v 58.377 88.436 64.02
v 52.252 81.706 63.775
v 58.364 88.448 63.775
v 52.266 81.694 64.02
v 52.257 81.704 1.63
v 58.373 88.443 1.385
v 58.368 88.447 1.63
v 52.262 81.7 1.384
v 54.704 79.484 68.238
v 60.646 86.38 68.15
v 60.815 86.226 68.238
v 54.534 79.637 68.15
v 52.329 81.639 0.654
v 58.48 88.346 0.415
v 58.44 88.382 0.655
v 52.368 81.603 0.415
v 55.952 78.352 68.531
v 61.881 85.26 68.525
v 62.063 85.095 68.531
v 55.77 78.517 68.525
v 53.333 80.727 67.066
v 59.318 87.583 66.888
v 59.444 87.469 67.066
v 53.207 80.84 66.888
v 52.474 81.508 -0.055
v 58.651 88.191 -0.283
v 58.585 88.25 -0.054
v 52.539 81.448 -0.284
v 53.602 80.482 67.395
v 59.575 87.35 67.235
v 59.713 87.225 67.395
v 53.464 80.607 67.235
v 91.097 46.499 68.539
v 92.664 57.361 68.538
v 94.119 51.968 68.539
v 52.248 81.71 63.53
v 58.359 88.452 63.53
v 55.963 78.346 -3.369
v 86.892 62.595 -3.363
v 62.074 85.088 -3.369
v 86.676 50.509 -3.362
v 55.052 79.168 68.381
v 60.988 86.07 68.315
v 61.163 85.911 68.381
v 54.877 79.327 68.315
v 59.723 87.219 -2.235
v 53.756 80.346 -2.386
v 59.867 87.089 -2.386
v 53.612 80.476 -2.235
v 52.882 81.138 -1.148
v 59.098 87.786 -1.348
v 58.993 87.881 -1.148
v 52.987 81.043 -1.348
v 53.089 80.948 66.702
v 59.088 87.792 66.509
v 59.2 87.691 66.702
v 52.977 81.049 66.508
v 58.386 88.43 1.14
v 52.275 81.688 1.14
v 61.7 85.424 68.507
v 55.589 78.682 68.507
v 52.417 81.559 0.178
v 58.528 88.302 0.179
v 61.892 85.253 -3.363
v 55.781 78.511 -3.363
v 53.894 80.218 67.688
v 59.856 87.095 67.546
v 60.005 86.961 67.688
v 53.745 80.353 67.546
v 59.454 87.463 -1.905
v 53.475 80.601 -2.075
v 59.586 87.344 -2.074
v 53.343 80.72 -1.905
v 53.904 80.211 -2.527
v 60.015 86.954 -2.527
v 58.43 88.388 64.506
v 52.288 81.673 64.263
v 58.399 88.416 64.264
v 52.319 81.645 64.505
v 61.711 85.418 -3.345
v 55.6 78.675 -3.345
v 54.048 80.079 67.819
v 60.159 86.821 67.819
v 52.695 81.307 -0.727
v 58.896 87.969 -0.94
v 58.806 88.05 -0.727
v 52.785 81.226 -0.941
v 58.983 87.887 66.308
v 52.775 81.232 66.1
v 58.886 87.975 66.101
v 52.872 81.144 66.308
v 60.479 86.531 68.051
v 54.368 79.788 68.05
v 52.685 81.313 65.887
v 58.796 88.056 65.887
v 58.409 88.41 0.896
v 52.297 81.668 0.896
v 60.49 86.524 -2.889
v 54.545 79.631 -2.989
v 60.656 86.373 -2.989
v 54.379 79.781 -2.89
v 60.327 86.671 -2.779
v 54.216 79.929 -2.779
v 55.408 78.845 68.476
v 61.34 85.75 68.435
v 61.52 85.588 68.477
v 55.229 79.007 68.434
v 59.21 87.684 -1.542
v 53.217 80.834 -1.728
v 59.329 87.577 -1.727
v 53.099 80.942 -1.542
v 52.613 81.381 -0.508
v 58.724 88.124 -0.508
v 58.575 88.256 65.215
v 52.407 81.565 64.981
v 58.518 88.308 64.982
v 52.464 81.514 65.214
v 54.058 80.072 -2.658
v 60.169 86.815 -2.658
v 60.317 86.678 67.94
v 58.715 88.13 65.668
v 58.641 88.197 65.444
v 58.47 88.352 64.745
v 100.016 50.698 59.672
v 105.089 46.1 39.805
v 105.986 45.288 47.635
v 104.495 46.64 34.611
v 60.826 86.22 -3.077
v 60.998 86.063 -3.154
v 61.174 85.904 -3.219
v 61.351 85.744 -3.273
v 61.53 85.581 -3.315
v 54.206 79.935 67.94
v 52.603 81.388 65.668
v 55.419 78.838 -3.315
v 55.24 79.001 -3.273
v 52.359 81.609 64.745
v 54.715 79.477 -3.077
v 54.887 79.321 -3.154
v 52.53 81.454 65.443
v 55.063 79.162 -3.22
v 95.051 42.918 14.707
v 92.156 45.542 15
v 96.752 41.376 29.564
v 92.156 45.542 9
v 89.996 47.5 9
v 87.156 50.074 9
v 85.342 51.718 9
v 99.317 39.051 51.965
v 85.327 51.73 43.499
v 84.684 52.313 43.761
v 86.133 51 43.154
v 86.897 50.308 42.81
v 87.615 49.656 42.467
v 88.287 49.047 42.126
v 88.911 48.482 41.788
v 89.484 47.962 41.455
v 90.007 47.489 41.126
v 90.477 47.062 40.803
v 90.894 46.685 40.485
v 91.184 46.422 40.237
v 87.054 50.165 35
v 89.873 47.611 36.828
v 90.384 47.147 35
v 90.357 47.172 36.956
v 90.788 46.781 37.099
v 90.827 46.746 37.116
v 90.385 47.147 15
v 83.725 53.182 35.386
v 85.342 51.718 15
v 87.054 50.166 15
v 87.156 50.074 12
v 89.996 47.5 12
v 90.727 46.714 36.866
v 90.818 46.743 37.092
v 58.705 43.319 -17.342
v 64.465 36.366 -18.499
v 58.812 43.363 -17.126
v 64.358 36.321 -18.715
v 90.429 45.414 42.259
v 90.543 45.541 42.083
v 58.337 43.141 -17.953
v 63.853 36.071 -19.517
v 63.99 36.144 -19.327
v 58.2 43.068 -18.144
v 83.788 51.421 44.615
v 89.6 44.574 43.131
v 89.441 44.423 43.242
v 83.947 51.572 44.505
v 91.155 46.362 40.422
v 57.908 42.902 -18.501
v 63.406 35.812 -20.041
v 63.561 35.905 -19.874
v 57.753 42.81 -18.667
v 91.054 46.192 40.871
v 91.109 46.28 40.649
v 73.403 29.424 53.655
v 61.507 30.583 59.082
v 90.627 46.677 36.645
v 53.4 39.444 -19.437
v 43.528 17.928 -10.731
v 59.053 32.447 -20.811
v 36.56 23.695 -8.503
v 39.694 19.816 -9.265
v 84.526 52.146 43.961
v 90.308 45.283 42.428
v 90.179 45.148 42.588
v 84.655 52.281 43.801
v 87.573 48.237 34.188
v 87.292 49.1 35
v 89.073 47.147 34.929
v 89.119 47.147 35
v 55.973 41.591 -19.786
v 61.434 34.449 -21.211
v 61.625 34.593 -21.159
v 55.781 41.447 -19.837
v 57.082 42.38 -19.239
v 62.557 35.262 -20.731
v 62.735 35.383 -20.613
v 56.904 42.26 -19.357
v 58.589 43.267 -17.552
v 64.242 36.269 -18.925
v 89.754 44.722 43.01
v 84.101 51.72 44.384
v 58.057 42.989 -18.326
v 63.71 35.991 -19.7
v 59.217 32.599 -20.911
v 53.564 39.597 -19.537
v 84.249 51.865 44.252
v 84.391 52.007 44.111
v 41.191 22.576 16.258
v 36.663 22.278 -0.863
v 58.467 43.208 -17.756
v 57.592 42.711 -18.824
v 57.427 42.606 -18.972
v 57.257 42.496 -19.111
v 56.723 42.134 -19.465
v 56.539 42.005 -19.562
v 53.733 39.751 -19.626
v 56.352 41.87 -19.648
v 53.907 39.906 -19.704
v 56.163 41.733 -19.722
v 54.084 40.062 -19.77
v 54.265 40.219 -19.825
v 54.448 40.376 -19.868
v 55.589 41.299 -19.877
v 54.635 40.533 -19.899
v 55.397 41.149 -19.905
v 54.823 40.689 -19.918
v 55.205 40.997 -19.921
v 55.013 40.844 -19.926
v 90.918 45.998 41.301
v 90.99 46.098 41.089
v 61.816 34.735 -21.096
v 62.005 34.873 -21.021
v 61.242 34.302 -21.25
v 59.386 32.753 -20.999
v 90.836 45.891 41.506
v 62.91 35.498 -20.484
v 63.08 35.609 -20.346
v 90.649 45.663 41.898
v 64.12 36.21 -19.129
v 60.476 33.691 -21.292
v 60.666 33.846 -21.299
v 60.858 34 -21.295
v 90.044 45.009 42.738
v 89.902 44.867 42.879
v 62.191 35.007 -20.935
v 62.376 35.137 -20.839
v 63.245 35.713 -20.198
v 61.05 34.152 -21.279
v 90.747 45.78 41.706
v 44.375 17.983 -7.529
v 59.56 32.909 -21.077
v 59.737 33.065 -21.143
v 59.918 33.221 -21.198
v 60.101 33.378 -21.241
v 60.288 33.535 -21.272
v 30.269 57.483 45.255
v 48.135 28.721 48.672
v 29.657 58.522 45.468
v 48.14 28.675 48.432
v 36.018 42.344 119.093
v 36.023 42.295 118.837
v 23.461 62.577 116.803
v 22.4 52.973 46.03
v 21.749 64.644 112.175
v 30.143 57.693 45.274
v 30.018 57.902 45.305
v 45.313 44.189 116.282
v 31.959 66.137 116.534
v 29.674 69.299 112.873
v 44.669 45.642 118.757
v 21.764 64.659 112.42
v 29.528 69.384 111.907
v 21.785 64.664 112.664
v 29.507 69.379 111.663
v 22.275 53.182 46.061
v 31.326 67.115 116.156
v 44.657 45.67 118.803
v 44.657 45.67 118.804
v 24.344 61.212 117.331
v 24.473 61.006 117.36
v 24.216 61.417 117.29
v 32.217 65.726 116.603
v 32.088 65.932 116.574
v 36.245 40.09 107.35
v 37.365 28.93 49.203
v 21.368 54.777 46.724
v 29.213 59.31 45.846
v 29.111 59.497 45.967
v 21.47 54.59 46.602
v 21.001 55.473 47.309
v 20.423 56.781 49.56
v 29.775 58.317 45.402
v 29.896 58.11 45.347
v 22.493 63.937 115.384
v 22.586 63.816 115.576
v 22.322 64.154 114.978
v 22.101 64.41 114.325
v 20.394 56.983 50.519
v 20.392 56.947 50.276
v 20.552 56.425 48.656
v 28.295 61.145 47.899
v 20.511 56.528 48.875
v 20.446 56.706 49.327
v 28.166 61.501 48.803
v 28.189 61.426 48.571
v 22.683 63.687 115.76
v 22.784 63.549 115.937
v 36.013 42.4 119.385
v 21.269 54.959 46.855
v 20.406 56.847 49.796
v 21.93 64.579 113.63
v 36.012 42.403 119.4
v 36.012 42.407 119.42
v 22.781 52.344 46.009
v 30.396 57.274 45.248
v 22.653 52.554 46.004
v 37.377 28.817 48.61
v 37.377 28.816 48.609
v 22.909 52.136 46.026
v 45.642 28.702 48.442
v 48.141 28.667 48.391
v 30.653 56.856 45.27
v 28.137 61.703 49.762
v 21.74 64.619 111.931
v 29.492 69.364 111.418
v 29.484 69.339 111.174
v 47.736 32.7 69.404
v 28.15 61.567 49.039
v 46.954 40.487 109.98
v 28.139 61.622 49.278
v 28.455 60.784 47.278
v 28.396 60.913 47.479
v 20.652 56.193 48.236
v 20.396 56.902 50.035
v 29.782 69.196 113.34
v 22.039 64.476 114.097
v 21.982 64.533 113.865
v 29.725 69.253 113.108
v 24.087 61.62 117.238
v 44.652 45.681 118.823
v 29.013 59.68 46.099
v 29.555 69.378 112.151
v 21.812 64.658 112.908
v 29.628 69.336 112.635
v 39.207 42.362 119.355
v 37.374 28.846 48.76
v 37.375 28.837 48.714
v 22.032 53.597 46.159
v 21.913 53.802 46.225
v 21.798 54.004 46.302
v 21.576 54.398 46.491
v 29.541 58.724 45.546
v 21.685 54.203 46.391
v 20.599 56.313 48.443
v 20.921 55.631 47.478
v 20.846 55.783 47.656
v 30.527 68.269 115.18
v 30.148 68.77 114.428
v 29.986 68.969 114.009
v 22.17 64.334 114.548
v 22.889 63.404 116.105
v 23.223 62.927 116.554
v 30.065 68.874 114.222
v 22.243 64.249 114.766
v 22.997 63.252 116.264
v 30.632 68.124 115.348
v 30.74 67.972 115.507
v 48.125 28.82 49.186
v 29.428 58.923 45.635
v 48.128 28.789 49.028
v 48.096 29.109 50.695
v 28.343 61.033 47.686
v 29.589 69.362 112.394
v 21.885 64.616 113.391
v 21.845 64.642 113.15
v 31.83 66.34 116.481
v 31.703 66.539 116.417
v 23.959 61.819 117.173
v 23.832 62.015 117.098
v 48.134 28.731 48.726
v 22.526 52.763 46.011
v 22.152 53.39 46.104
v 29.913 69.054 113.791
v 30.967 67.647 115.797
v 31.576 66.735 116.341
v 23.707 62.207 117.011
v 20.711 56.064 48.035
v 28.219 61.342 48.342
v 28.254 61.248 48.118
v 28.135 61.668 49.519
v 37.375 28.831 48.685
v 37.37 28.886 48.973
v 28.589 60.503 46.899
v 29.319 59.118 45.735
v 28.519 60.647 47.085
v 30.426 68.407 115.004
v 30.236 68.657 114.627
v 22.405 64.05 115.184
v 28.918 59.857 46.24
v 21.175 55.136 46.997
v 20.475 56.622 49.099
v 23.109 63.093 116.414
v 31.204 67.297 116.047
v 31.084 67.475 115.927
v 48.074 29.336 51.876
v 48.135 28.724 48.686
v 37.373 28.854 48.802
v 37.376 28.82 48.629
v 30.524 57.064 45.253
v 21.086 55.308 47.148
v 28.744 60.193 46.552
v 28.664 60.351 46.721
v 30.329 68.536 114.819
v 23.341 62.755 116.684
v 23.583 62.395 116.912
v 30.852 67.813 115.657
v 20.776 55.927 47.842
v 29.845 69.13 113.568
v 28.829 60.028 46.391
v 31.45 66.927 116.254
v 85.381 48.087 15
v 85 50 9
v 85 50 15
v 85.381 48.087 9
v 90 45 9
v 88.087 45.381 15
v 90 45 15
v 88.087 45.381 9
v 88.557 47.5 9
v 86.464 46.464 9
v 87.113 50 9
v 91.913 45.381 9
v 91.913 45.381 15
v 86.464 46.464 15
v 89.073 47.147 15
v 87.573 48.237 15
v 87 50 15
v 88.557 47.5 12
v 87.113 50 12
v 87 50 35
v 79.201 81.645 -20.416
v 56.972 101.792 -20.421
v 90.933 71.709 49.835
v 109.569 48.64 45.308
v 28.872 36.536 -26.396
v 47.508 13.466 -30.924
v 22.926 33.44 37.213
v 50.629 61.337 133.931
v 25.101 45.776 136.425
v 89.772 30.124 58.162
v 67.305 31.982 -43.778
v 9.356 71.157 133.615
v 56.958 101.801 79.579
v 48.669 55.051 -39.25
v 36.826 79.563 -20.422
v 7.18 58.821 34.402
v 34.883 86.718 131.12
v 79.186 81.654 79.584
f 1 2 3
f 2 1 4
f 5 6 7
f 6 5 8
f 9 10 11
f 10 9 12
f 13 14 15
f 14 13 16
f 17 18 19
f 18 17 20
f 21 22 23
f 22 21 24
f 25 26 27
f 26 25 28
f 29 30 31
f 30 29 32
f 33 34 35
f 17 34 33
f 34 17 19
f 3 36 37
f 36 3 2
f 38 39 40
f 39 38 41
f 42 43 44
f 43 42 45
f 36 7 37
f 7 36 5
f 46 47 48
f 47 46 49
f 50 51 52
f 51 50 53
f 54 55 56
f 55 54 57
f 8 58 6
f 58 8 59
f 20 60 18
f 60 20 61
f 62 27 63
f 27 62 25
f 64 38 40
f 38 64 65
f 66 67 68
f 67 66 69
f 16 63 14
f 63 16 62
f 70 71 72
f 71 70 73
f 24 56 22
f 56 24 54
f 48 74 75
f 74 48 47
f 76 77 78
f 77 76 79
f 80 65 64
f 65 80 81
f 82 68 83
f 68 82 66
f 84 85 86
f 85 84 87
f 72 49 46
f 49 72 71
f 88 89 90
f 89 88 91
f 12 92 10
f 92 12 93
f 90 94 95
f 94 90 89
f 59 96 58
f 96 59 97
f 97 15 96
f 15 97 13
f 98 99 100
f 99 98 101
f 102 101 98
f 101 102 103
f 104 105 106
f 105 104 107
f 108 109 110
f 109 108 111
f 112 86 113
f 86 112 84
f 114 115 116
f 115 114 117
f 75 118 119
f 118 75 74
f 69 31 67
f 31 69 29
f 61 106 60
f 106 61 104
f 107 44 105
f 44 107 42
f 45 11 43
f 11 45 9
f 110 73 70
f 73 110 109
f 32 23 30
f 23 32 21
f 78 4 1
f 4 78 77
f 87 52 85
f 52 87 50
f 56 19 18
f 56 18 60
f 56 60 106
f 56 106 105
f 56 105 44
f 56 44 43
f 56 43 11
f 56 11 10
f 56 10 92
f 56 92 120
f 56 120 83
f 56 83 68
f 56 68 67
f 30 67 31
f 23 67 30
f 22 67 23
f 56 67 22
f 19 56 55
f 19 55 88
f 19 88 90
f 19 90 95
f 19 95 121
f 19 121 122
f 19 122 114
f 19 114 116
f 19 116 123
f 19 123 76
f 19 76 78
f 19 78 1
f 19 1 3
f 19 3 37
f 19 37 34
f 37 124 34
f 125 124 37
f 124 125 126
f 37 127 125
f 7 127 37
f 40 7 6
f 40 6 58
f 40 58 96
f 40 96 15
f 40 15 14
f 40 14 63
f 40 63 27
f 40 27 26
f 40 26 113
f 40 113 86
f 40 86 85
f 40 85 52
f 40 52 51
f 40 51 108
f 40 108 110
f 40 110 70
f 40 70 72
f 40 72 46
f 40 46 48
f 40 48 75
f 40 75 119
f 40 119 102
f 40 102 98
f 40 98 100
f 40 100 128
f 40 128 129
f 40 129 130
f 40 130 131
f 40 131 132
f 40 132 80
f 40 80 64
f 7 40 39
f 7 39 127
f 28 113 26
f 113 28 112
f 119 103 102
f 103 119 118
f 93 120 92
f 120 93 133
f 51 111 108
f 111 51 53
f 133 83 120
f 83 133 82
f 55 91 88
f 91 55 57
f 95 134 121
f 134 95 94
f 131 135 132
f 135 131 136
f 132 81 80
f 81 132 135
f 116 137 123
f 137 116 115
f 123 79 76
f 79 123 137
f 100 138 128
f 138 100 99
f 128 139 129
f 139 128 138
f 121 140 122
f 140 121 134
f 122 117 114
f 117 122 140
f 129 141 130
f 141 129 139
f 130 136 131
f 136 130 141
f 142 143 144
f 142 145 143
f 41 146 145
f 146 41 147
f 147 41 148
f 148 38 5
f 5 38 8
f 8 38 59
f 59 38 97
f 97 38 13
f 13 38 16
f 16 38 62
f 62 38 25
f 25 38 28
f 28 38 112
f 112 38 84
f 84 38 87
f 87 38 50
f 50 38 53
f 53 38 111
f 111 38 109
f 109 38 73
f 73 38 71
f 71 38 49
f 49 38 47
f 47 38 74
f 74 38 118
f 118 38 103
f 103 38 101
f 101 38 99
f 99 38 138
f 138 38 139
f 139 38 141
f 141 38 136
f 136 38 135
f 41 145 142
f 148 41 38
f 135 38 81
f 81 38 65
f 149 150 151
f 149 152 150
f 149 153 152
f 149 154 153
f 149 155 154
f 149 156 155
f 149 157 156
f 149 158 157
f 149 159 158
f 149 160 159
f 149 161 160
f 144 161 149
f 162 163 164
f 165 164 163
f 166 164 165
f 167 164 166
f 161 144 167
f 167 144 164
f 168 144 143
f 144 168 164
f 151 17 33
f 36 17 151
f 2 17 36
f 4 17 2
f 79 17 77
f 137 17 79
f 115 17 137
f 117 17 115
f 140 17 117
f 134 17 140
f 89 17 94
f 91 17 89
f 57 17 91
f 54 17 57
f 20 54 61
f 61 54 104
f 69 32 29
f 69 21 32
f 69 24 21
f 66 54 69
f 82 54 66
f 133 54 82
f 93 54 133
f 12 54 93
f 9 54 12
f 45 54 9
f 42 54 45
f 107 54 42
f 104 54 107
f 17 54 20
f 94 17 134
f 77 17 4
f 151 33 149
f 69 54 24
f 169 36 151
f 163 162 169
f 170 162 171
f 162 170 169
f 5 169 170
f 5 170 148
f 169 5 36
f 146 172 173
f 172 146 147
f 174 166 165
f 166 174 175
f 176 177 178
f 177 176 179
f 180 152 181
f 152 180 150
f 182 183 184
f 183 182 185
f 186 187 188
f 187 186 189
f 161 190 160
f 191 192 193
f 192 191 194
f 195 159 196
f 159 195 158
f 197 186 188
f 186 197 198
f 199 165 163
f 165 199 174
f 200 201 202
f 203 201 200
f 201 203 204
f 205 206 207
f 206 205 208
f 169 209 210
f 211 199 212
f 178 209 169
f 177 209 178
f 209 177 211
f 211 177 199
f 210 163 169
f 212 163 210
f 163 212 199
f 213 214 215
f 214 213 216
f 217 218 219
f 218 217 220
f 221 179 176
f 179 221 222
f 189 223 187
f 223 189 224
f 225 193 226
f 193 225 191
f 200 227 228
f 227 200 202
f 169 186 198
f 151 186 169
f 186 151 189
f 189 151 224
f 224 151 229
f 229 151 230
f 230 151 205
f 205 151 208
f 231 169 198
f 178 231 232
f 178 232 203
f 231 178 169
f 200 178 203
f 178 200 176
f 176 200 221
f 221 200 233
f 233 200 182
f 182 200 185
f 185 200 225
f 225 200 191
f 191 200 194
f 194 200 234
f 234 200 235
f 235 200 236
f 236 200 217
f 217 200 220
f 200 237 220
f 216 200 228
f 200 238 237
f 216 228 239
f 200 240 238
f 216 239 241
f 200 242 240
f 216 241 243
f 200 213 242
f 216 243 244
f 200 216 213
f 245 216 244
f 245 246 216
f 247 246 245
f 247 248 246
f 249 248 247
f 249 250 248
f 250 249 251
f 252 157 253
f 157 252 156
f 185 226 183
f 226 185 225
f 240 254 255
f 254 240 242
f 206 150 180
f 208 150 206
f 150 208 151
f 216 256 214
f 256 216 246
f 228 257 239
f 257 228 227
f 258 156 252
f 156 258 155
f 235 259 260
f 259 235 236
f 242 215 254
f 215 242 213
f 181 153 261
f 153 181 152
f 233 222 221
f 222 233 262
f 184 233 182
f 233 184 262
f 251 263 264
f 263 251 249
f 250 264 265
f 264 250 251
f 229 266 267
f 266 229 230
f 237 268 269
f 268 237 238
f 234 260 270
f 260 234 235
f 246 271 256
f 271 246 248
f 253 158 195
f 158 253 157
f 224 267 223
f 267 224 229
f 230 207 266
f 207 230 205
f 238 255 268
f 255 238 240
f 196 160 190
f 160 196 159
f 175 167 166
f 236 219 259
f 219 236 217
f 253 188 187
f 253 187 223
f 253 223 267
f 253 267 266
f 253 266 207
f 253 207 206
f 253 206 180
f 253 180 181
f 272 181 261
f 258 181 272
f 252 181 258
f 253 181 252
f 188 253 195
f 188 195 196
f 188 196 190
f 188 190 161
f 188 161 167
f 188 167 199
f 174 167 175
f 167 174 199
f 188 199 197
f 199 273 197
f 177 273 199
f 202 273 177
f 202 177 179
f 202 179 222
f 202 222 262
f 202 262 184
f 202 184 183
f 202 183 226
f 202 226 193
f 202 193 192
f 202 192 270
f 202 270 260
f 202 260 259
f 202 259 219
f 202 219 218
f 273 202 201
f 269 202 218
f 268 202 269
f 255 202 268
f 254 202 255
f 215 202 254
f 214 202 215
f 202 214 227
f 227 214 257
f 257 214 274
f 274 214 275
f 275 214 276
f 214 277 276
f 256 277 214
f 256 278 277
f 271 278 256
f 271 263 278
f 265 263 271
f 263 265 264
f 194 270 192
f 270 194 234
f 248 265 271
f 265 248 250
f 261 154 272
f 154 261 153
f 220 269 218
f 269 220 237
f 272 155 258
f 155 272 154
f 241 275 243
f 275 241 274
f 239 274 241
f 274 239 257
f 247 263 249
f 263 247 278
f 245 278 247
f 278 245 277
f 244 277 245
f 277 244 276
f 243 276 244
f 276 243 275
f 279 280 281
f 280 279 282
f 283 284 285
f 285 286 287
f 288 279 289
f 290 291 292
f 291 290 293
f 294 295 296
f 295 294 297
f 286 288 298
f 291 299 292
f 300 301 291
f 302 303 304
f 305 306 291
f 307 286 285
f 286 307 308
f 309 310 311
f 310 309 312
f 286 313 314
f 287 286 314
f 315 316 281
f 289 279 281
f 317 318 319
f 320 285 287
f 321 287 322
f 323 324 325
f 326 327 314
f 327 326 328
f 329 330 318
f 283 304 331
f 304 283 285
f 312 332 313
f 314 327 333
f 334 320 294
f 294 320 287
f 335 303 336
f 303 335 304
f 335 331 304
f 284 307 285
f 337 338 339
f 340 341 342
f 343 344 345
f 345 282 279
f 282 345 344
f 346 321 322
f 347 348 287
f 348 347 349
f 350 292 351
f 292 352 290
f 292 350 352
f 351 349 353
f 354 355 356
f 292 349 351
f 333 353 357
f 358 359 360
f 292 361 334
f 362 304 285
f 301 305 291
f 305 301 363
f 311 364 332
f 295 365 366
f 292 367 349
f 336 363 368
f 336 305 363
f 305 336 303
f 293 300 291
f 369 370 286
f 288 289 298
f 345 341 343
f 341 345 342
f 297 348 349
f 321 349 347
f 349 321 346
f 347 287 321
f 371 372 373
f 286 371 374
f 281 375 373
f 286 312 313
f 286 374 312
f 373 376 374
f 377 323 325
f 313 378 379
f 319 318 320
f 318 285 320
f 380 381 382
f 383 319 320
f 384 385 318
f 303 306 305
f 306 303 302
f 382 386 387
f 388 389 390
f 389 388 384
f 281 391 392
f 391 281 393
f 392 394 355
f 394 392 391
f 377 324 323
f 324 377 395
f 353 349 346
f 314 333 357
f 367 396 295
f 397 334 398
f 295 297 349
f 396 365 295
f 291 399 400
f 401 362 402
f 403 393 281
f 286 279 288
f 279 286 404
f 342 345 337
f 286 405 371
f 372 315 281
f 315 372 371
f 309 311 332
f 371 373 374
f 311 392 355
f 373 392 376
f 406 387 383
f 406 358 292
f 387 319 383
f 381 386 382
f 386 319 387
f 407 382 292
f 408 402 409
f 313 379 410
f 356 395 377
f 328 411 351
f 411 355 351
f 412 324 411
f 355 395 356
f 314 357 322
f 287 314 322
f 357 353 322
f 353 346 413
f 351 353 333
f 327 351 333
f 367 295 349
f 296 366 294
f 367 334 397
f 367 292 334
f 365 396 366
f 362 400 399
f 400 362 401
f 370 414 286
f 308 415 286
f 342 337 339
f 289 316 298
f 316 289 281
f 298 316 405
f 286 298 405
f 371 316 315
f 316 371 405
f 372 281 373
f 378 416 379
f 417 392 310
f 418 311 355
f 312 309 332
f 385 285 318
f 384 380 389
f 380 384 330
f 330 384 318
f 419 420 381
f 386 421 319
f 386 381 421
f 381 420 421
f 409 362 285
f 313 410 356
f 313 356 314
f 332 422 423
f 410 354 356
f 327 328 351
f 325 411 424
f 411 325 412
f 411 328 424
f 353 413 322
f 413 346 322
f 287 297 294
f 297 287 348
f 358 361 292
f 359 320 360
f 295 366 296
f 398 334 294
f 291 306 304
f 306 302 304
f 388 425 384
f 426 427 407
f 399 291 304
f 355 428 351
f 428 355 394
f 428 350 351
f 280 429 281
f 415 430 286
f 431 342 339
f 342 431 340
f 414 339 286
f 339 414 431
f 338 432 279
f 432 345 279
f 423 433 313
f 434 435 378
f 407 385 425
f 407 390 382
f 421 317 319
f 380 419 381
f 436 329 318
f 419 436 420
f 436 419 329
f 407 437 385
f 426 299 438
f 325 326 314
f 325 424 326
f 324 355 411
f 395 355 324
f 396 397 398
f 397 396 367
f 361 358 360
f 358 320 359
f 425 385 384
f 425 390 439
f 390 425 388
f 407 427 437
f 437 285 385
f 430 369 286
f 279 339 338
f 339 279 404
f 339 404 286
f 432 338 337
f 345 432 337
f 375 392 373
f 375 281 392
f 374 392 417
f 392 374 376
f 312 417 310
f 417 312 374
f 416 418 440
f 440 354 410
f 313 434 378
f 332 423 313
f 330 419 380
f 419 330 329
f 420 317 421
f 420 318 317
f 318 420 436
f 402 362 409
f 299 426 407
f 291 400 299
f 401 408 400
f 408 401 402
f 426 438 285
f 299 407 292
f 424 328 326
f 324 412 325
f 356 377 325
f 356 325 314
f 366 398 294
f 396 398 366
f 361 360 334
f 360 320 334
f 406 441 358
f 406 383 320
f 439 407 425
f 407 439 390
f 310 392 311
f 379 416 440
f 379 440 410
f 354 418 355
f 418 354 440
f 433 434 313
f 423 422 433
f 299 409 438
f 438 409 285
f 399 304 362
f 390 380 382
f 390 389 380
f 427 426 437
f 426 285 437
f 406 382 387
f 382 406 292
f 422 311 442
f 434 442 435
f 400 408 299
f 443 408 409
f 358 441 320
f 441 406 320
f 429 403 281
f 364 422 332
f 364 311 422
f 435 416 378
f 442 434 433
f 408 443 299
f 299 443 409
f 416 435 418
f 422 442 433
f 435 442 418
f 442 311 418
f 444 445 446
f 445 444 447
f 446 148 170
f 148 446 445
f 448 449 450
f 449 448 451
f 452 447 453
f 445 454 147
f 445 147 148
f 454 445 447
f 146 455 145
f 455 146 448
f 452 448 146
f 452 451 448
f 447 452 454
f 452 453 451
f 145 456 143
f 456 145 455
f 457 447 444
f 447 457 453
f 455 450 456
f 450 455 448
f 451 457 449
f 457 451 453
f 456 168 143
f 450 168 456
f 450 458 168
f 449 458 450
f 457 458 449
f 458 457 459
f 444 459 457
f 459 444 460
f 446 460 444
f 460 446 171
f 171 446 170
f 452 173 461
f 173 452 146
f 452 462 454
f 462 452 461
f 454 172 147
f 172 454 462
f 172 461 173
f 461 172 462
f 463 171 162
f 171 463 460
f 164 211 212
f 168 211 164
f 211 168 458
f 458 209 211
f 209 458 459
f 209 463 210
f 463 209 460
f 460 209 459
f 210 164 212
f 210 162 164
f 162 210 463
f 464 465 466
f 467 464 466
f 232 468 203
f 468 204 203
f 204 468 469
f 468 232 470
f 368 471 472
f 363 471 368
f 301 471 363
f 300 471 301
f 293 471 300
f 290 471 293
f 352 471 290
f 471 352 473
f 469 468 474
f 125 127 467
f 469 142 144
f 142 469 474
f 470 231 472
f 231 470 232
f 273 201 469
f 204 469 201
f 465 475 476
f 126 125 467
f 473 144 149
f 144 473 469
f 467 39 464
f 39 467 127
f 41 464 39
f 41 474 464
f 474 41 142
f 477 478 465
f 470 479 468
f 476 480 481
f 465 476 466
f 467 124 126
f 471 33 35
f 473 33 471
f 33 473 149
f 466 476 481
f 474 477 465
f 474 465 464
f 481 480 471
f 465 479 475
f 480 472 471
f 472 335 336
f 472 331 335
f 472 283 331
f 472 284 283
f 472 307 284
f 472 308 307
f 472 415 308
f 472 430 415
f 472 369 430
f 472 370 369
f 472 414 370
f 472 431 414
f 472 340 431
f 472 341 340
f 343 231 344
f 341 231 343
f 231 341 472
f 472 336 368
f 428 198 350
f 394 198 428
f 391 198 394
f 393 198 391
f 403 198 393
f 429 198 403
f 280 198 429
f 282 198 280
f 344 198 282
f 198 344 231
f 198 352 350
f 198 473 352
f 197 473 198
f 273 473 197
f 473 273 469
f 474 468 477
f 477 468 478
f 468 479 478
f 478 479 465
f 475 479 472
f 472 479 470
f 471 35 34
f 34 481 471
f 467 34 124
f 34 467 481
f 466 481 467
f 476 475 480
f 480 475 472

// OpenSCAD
// file: layouts/l6-playa.scad
POSITIONS = [
  [[131.59, 277.196, 80],  [20.2851, 56.366, 45.558]],
  [[100.181, 89.99, 327.994],   [58.35841, 88.4529, 68.5301]],
  [[250.596, 117.019, 21.5107], [92.7403, 47.5094, 41.0992]]
];
// file: nutsnbolts/data-access.scad
// Norm Nuts and Bolts - a OpenSCAD library
// Copyright (C) 2012  Johannes Kneer

// This program is free software: you can redistribute it and/or modify
// it under the terms of the GNU General Public License as published by
// the Free Software Foundation, either version 3 of the License, or
// (at your option) any later version.

// This program is distributed in the hope that it will be useful,
// but WITHOUT ANY WARRANTY; without even the implied warranty of
// MERCHANTABILITY or FITNESS FOR A PARTICULAR PURPOSE.  See the
// GNU General Public License for more details.

// You should have received a copy of the GNU General Public License
// along with this program.  If not, see <http://www.gnu.org/licenses/>.


// DATABASE ACCESS FUNCTIONS AND CONSTANTS



// == CONSTANTS ==

// screw table access keys
_NB_S_DESC            = 0;
_NB_S_FAMKEY			    = 1;
_NB_S_LENGTH          = 2;
_NB_S_NOTHREAD_LENGTH = 3;

_NB_F_DESC			      = 0;
_NB_F_OUTER_DIA       = 1;
_NB_F_INNER_DIA       = 2;
_NB_F_LEAD            = 3;
_NB_F_KEY             = 4;
_NB_F_KEY_DEPTH       = 5;
_NB_F_HEAD_HEIGHT     = 6;
_NB_F_HEAD_DIA        = 7;
_NB_F_NUT_KEY         = 8;
_NB_F_NUT_HEIGHT      = 9;
_NB_F_PITCH_FINE      = 10;
_NB_F_PITCH_MEDIUM    = 11;
_NB_F_PITCH_COARSE    = 12;


// == FUNCTIONS ==

// _get_screw("descriptor")   with descriptor = M8x25
//   find the line for a general object in the data matrix

function _get_screw(n) = data_screw[search([n], data_screw)[0]];
function _get_screw_fam(n) = data_screw_fam[search([_get_screw(n)[_NB_S_FAMKEY]], data_screw_fam)[0]];

function _get_fam(n) = data_screw_fam[search([n], data_screw_fam)[0]];


// _get_XXXXX("descriptor") functions
// find a single property in the database

function _get_desc(n)        = _get_screw(n)[_NB_S_DESC];
function _get_famkey(n)         = _get_screw(n)[_NB_S_FAMKEY];
function _get_length(n)      = _get_screw(n)[_NB_S_LENGTH];
function _get_nt_length(n)   = _get_screw(n)[_NB_S_NOTHREAD_LENGTH];

function _get_outer_dia(n)   = _get_screw_fam(n)[_NB_F_OUTER_DIA];
function _get_inner_dia(n)   = _get_screw_fam(n)[_NB_F_INNER_DIA];
function _get_lead(n)        = _get_screw_fam(n)[_NB_F_LEAD];
function _get_head_height(n) = _get_screw_fam(n)[_NB_F_HEAD_HEIGHT];
function _get_head_dia(n)    = _get_screw_fam(n)[_NB_F_HEAD_DIA];
function _get_nut_key(n)     = _get_screw_fam(n)[_NB_F_NUT_KEY];
function _get_nut_height(n)  = _get_screw_fam(n)[_NB_F_NUT_HEIGHT];
function _get_fine_pitch(n)  = _get_screw_fam(n)[_NB_F_PITCH_FINE];
function _get_medium_pitch(n)  = _get_screw_fam(n)[_NB_F_PITCH_MEDIUM];
function _get_coarse_pitch(n)  = _get_screw_fam(n)[_NB_F_PITCH_COARSE];
// file: scad-utils/mirror.scad
// Copyright (c) 2013 Oskar Linde. All rights reserved.
// License: BSD
//
// This library contains simple mirroring functions
//
// mirror_x()
// mirror_y()
// mirror_z()


module mirror_x() {
  union() {
    child();
    scale([-1,1,1]) child();
  }
}

module mirror_y() {
  union() {
    child();
    scale([1,-1,1]) child();
  }
}

module mirror_z() {
  union() {
    child();
    scale([1,1,-1]) child();
  }
}
// file: constants.scad
include <layouts/l6-playa.scad>

INCH = 25.4;
CUBE_SIZE = 100;
CEIL_CLEARANCE = 600;
NUM_PHONES = 3;
DRAW_RANDOM = false;


PANE_WIDTH = 10 * INCH;
PANE_HEIGHT = 8 * INCH;
PANE_THICKNESS = 2;

FRAME_PADDING = INCH / 4;

FRAME_WIDTH = PANE_WIDTH + 2 * FRAME_PADDING;
FRAME_HEIGHT = PANE_HEIGHT + 2 * FRAME_PADDING;
FRAME_THICKNESS = INCH / 4;


PHONE_HEIGHT = 147.8;
PHONE_WIDTH = 71.9;
PHONE_DEPTH = 9.1;
PHONE_SCREEN_TOP = 19; //wrt case top
PHONE_SCREEN_HEIGHT = 110;
PHONE_SCREEN_WIDTH = 68;
PHONE_LENS_DIA = 11.85;
PHONE_LENS_OFFSET_LEFT = 3;
PHONE_LENS_OFFSET_TOP = 3.65;
PHONE_LENS_FIELD_OF_VIEW = 81;
PHONE_POWER_BUTTON_TOP = 52;

CASE_THICKNESS = 1.5;
WALL_THICKNESS = 3;
CASE_HEIGHT = PHONE_HEIGHT + 2 * WALL_THICKNESS;
CASE_WIDTH = PHONE_WIDTH + 2 * WALL_THICKNESS;
CASE_DEPTH = PHONE_DEPTH + 2 * CASE_THICKNESS;

// new iteration using baby USB cams
BOARD_WIDTH = 32.5;
BOARD_HEIGHT = 32.5;
BOARD_DEPTH = 5;

USB_MICROB_WIDTH = 8;
USB_MICROB_LENGTH = 5;
USB_CHANNEL_WIDTH = 8;
USB_CHANNEL_LENGTH = 20;
USB_CHANNEL_DEPTH = 20;

CASE_ANCHOR_OFFSET = 14;
CASE_ANCHOR_POINTS = [
  [0, 0, 0],
  [0, BOARD_HEIGHT, 0],
  [BOARD_WIDTH, BOARD_HEIGHT, 0],
  [BOARD_WIDTH, 0, 0]
];

PANE_ANCHOR_OFFSET = 0;
PANE_ANCHOR_POINTS = [
  [0, PANE_ANCHOR_OFFSET, 0],
  [0, PANE_HEIGHT - PANE_ANCHOR_OFFSET, 0],
  [PANE_WIDTH, PANE_HEIGHT - PANE_ANCHOR_OFFSET, 0],
  [PANE_WIDTH, PANE_ANCHOR_OFFSET, 0]
];

HOLDER_WIDTH = 100;
HOLDER_HEIGHT = 20;
HOLDER_DEPTH = 30;
HOLDER_FOOT = 10;


d = 0.01;
d2 = 2 * d;
wiggle = 1;
// file: helpers.scad
include <constants.scad>

function get_rotation_matricies(theta) = [
  [[1, 0, 0], [0, cos(theta), -sin(theta)], [0, sin(theta), cos(theta)]],
  [[cos(theta), 0, sin(theta)], [0, 1, 0], [-sin(theta), 0, cos(theta)]],
  [[cos(theta), -sin(theta), 0], [sin(theta), cos(theta), 0], [0, 0, 1]]
];

function get_rotation_matrix(axis, theta) = get_rotation_matricies(theta)[axis];

function rotate_point(rotation, point) =
  get_rotation_matrix(2, rotation[2]) *
  get_rotation_matrix(1, rotation[1]) *
  get_rotation_matrix(0, rotation[0]) *
  point;

function clamp_safe(point, translation) =
  let(pt = [for(i=[0, 2]) point[i] + translation[i]])
  [for(i=[0, 2])
    (pt[i] > CUBE_SIZE) ? point[i] - (pt[i] - CUBE_SIZE) :
    (pt[i] < 0) ? point[i] - pt[i] :
    point[i]
  ];

function is_safe_point(point, translation) =
  let(pt = [point[0] + translation[0], point[1] + translation[1], point[2] + translation[2]])
  pt[0] > 0 && pt[0] < CUBE_SIZE &&
  pt[1] > 0 && pt[1] < CUBE_SIZE &&
  pt[2] > 0 && pt[2] < CUBE_SIZE;

function is_safe(rotation, translation) =
  min([for(point = CASE_ANCHOR_POINTS) is_safe_point(rotate_point(rotation, point), translation) ? 1 : 0]) == 1;

function get_safe_translation_and_rotation(index, size) = DRAW_RANDOM ?
  (let (position = [rands(0, 360, 3), rands(0, size, 3)])
   is_safe(position[0], position[1]) ? position : get_safe_translation_and_rotation(index, size)
  ) : [ POSITIONS[index][0], POSITIONS[index][1] ];

module label(position_i, support_i, point, zpos) {
  pos_name = str(position_i);
  support_name = chr(support_i + 65);
  support_length = support_len(point, zpos);
  color("white")
  translate([ point[0], point[1], 0])
    union() {
      circle(2);
      translate([5, 0, 0])
      text(pos_name, size = 5);
      translate([10, 0, 0])
        text(support_name, size=3);
      translate([5, -4, 0])
        text(str(support_length), size=3);
    }
  sep = "\t";
  echo(str(pos_name, support_name, sep, support_length, sep, point));
}
// file: case.scad
use <scad-utils/morphology.scad>
include <constants.scad>
include <helpers.scad>

EXIT_LENGTH = 10;
CLEAT_WIDTH = 2.5;
CLEAT_HEIGHT = 1.5;
CLEAT_DIST = 3;

$fn = 128;

module phone() {
  //color("black")
  linear_extrude(PHONE_DEPTH)
  rounding(5)
    square([PHONE_WIDTH, PHONE_HEIGHT]);
}

module phone_camera() {
  translate([
    PHONE_WIDTH - PHONE_LENS_OFFSET_LEFT - PHONE_LENS_DIA/2,
    PHONE_HEIGHT + CASE_THICKNESS - PHONE_LENS_OFFSET_TOP - PHONE_LENS_DIA / 2,
    -d
    ])
    cylinder(d=PHONE_LENS_DIA, h=CASE_THICKNESS + d2);
}


module phone_exit() {
  translate([(CASE_WIDTH - PHONE_WIDTH) / 2, -1, (CASE_DEPTH - PHONE_DEPTH) / 2])
  cube([PHONE_WIDTH, EXIT_LENGTH, PHONE_DEPTH]);
}

module phone_screen() {
  translate([(CASE_WIDTH - PHONE_SCREEN_WIDTH) / 2,  CASE_HEIGHT - PHONE_SCREEN_TOP - PHONE_SCREEN_HEIGHT , PHONE_DEPTH])
  linear_extrude(PHONE_DEPTH)
    square([PHONE_SCREEN_WIDTH, PHONE_SCREEN_HEIGHT]);
}

module case_outer() {
  color("blue")
  linear_extrude(CASE_DEPTH)
  rounding(8)
    square([CASE_WIDTH, CASE_HEIGHT]);
}

module power_button_access() {
  v = [WALL_THICKNESS + d2, 14, 4];
  translate([CASE_WIDTH - WALL_THICKNESS - d, CASE_HEIGHT - PHONE_POWER_BUTTON_TOP - v[1], CASE_DEPTH / 2])
    translate([0, 0, -2])
    cube(v);
}

module cleat() {
  translate([-d, -CLEAT_DIST/2 - CLEAT_WIDTH/2, -CLEAT_HEIGHT / 2])
    union() {
      cube([WALL_THICKNESS + d2, CLEAT_WIDTH, CLEAT_HEIGHT]);
      translate([0, CLEAT_WIDTH + CLEAT_DIST, 0])
        cube([WALL_THICKNESS + d, CLEAT_WIDTH, CLEAT_HEIGHT]);
    }
}

module position_cleats() {
  for (position = CASE_ANCHOR_POINTS) {
    translate([0, 0, CASE_DEPTH/2])
    translate(position)
      cleat();
  }
}

module position_phone_in_case() {
  translate([WALL_THICKNESS, WALL_THICKNESS, CASE_THICKNESS])
    phone();
}

module case_bool() {
  difference() {
    case_outer();
    position_phone_in_case();
    phone_screen();
    phone_exit();
    phone_camera();
    position_cleats();
    power_button_access();
  }
}

case_bool();
// file: scad-utils/morphology.scad
// Copyright (c) 2013 Oskar Linde. All rights reserved.
// License: BSD
//
// This library contains basic 2D morphology operations
//
// outset(d=1)            - creates a polygon at an offset d outside a 2D shape
// inset(d=1)             - creates a polygon at an offset d inside a 2D shape
// fillet(r=1)            - adds fillets of radius r to all concave corners of a 2D shape
// rounding(r=1)          - adds rounding to all convex corners of a 2D shape
// shell(d,center=false)  - makes a shell of width d along the edge of a 2D shape
//                        - positive values of d places the shell on the outside
//                        - negative values of d places the shell on the inside
//                        - center=true and positive d places the shell centered on the edge

module outset(d=1) {
	// Bug workaround for older OpenSCAD versions
	if (version_num() < 20130424) render() outset_extruded(d) child();
	else minkowski() {
		circle(r=d);
		child();
	}
}

module outset_extruded(d=1) {
   projection(cut=true) minkowski() {
        cylinder(r=d);
        linear_extrude(center=true) child();
   }
}

module inset(d=1) {
	 render() inverse() outset(d=d) inverse() child();
}

module fillet(r=1) {
	inset(d=r) render() outset(d=r) child();
}

module rounding(r=1) {
	outset(d=r) inset(d=r) child();
}

module shell(d,center=false) {
	if (center && d > 0) {
		difference() {
			outset(d=d/2) child();
			inset(d=d/2) child();
		}
	}
	if (!center && d > 0) {
		difference() {
			outset(d=d) child();
			child();
		}
	}
	if (!center && d < 0) {
		difference() {
			child();
			inset(d=-d) child();
		}
	}
	if (d == 0) child();
}


// Below are for internal use only

module inverse() {
	difference() {
		square(1e5,center=true);
		child();
	}
}


// TEST CODE

use <mirror.scad>

module arrow(l=1,w=.6,t=0.15) {
	mirror_y() polygon([[0,0],[l,0],[l-w/2,w/2],[l-w/2-sqrt(2)*t,w/2],[l-t/2-sqrt(2)*t,t/2],[0,t/2]]);
}

module shape() {
	polygon([[0,0],[1,0],[1.5,1],[2.5,1],[2,-1],[0,-1]]);
}

if(0) assign($fn=32) {

	for (p = [0:10*3-1]) assign(o=floor(p/3)) {
		translate([(p%3)*2.5,-o*3]) {
			//%if (p % 3 == 1) translate([0,0,1]) shape();
			if (p % 3 == 0) shape();
			if (p % 3 == 1) translate([0.6,0]) arrow();
			if (p % 3 == 2) {
				if (o == 0) inset(d=0.3) shape();
				if (o == 1) outset(d=0.3) shape();
				if (o == 2) rounding(r=0.3) shape();
				if (o == 3) fillet(r=0.3) shape();
				if (o == 4) shell(d=0.3) shape();
				if (o == 5) shell(d=-0.3) shape();
				if (o == 6) shell(d=0.3,center=true) shape();
				if (o == 7) rounding(r=0.3) fillet(r=0.3) shape();
				if (o == 8) shell(d=0.3,center=true) fillet(r=0.3) rounding(r=0.3) shape();
				if (o == 9) shell(d=-0.3) fillet(r=0.3) rounding(r=0.3) shape();
			}
		}
	}
}
// main file
use <scad-utils/morphology.scad>
use <nutsnbolts/cyl_head_bolt.scad>
use <case.scad>
include <helpers.scad>
include <constants.scad>
numToDraw = DRAW_RANDOM ? NUM_PHONES : len(POSITIONS);
positions = [for(i=[0:numToDraw - 1]) get_safe_translation_and_rotation(i, CUBE_SIZE)];

FLOOR_HEIGHT = 15;

module draw_phone(index, rotation, translation, with_fov) {
  echo(str("#", index, "\t ", rotation, "\t ", translation));
  translate(translation)
  difference() {
    rotate(rotation)
      union() {
        slot(index);
        if(with_fov) {
          field_of_view();
        }
    }
  }
}

module draw_holder() {
  w = HOLDER_WIDTH;
  h = HOLDER_HEIGHT;
  d = HOLDER_DEPTH;
  foot = HOLDER_FOOT;
  translate([0, -foot, 0])
  translate([CASE_WIDTH/2 - w/2, 0, CASE_DEPTH/2 - d/2])
    cube([w, h + foot, d]);
}

module slot(id) {
  if (id) {
    color("black")
    translate([PHONE_WIDTH/2 - 5, PHONE_HEIGHT-15, PHONE_DEPTH + d])
    linear_extrude(1)
      text(str(id));
  }
  phone();

}
module field_of_view(length=70) {
  d2 = 2 * length * cos(PHONE_LENS_FIELD_OF_VIEW / 2);
  position_camera() {
    rotate([180, 0, 0])
      cylinder(d1 = PHONE_LENS_DIA, d2=d2, h=length);
  }
}

module phones(with_fov=false) {
  for (i=[0:len(positions) - 1]) {
    translate([0, 0, 0])
      draw_phone(i, positions[i][0], positions[i][1], with_fov);
  }
}

module holders() {
  color("blue")
  hull(){
    for (p=positions) {
      translate(p[1])
      rotate(p[0])
        union() {
          draw_holder();
        }
    }
  }
}

module tripod_mount() {
  translate([CUBE_SIZE/2 + 40, CUBE_SIZE/2, FLOOR_HEIGHT])
    rotate([180, 0, 0])
  screw("M6x20");
}

module floor() {
  cube([CUBE_SIZE + 100, CUBE_SIZE + 100, FLOOR_HEIGHT]);
}

difference() {
  holders();
  phones();
  tripod_mount();
}
//phones(with_fov=true);
